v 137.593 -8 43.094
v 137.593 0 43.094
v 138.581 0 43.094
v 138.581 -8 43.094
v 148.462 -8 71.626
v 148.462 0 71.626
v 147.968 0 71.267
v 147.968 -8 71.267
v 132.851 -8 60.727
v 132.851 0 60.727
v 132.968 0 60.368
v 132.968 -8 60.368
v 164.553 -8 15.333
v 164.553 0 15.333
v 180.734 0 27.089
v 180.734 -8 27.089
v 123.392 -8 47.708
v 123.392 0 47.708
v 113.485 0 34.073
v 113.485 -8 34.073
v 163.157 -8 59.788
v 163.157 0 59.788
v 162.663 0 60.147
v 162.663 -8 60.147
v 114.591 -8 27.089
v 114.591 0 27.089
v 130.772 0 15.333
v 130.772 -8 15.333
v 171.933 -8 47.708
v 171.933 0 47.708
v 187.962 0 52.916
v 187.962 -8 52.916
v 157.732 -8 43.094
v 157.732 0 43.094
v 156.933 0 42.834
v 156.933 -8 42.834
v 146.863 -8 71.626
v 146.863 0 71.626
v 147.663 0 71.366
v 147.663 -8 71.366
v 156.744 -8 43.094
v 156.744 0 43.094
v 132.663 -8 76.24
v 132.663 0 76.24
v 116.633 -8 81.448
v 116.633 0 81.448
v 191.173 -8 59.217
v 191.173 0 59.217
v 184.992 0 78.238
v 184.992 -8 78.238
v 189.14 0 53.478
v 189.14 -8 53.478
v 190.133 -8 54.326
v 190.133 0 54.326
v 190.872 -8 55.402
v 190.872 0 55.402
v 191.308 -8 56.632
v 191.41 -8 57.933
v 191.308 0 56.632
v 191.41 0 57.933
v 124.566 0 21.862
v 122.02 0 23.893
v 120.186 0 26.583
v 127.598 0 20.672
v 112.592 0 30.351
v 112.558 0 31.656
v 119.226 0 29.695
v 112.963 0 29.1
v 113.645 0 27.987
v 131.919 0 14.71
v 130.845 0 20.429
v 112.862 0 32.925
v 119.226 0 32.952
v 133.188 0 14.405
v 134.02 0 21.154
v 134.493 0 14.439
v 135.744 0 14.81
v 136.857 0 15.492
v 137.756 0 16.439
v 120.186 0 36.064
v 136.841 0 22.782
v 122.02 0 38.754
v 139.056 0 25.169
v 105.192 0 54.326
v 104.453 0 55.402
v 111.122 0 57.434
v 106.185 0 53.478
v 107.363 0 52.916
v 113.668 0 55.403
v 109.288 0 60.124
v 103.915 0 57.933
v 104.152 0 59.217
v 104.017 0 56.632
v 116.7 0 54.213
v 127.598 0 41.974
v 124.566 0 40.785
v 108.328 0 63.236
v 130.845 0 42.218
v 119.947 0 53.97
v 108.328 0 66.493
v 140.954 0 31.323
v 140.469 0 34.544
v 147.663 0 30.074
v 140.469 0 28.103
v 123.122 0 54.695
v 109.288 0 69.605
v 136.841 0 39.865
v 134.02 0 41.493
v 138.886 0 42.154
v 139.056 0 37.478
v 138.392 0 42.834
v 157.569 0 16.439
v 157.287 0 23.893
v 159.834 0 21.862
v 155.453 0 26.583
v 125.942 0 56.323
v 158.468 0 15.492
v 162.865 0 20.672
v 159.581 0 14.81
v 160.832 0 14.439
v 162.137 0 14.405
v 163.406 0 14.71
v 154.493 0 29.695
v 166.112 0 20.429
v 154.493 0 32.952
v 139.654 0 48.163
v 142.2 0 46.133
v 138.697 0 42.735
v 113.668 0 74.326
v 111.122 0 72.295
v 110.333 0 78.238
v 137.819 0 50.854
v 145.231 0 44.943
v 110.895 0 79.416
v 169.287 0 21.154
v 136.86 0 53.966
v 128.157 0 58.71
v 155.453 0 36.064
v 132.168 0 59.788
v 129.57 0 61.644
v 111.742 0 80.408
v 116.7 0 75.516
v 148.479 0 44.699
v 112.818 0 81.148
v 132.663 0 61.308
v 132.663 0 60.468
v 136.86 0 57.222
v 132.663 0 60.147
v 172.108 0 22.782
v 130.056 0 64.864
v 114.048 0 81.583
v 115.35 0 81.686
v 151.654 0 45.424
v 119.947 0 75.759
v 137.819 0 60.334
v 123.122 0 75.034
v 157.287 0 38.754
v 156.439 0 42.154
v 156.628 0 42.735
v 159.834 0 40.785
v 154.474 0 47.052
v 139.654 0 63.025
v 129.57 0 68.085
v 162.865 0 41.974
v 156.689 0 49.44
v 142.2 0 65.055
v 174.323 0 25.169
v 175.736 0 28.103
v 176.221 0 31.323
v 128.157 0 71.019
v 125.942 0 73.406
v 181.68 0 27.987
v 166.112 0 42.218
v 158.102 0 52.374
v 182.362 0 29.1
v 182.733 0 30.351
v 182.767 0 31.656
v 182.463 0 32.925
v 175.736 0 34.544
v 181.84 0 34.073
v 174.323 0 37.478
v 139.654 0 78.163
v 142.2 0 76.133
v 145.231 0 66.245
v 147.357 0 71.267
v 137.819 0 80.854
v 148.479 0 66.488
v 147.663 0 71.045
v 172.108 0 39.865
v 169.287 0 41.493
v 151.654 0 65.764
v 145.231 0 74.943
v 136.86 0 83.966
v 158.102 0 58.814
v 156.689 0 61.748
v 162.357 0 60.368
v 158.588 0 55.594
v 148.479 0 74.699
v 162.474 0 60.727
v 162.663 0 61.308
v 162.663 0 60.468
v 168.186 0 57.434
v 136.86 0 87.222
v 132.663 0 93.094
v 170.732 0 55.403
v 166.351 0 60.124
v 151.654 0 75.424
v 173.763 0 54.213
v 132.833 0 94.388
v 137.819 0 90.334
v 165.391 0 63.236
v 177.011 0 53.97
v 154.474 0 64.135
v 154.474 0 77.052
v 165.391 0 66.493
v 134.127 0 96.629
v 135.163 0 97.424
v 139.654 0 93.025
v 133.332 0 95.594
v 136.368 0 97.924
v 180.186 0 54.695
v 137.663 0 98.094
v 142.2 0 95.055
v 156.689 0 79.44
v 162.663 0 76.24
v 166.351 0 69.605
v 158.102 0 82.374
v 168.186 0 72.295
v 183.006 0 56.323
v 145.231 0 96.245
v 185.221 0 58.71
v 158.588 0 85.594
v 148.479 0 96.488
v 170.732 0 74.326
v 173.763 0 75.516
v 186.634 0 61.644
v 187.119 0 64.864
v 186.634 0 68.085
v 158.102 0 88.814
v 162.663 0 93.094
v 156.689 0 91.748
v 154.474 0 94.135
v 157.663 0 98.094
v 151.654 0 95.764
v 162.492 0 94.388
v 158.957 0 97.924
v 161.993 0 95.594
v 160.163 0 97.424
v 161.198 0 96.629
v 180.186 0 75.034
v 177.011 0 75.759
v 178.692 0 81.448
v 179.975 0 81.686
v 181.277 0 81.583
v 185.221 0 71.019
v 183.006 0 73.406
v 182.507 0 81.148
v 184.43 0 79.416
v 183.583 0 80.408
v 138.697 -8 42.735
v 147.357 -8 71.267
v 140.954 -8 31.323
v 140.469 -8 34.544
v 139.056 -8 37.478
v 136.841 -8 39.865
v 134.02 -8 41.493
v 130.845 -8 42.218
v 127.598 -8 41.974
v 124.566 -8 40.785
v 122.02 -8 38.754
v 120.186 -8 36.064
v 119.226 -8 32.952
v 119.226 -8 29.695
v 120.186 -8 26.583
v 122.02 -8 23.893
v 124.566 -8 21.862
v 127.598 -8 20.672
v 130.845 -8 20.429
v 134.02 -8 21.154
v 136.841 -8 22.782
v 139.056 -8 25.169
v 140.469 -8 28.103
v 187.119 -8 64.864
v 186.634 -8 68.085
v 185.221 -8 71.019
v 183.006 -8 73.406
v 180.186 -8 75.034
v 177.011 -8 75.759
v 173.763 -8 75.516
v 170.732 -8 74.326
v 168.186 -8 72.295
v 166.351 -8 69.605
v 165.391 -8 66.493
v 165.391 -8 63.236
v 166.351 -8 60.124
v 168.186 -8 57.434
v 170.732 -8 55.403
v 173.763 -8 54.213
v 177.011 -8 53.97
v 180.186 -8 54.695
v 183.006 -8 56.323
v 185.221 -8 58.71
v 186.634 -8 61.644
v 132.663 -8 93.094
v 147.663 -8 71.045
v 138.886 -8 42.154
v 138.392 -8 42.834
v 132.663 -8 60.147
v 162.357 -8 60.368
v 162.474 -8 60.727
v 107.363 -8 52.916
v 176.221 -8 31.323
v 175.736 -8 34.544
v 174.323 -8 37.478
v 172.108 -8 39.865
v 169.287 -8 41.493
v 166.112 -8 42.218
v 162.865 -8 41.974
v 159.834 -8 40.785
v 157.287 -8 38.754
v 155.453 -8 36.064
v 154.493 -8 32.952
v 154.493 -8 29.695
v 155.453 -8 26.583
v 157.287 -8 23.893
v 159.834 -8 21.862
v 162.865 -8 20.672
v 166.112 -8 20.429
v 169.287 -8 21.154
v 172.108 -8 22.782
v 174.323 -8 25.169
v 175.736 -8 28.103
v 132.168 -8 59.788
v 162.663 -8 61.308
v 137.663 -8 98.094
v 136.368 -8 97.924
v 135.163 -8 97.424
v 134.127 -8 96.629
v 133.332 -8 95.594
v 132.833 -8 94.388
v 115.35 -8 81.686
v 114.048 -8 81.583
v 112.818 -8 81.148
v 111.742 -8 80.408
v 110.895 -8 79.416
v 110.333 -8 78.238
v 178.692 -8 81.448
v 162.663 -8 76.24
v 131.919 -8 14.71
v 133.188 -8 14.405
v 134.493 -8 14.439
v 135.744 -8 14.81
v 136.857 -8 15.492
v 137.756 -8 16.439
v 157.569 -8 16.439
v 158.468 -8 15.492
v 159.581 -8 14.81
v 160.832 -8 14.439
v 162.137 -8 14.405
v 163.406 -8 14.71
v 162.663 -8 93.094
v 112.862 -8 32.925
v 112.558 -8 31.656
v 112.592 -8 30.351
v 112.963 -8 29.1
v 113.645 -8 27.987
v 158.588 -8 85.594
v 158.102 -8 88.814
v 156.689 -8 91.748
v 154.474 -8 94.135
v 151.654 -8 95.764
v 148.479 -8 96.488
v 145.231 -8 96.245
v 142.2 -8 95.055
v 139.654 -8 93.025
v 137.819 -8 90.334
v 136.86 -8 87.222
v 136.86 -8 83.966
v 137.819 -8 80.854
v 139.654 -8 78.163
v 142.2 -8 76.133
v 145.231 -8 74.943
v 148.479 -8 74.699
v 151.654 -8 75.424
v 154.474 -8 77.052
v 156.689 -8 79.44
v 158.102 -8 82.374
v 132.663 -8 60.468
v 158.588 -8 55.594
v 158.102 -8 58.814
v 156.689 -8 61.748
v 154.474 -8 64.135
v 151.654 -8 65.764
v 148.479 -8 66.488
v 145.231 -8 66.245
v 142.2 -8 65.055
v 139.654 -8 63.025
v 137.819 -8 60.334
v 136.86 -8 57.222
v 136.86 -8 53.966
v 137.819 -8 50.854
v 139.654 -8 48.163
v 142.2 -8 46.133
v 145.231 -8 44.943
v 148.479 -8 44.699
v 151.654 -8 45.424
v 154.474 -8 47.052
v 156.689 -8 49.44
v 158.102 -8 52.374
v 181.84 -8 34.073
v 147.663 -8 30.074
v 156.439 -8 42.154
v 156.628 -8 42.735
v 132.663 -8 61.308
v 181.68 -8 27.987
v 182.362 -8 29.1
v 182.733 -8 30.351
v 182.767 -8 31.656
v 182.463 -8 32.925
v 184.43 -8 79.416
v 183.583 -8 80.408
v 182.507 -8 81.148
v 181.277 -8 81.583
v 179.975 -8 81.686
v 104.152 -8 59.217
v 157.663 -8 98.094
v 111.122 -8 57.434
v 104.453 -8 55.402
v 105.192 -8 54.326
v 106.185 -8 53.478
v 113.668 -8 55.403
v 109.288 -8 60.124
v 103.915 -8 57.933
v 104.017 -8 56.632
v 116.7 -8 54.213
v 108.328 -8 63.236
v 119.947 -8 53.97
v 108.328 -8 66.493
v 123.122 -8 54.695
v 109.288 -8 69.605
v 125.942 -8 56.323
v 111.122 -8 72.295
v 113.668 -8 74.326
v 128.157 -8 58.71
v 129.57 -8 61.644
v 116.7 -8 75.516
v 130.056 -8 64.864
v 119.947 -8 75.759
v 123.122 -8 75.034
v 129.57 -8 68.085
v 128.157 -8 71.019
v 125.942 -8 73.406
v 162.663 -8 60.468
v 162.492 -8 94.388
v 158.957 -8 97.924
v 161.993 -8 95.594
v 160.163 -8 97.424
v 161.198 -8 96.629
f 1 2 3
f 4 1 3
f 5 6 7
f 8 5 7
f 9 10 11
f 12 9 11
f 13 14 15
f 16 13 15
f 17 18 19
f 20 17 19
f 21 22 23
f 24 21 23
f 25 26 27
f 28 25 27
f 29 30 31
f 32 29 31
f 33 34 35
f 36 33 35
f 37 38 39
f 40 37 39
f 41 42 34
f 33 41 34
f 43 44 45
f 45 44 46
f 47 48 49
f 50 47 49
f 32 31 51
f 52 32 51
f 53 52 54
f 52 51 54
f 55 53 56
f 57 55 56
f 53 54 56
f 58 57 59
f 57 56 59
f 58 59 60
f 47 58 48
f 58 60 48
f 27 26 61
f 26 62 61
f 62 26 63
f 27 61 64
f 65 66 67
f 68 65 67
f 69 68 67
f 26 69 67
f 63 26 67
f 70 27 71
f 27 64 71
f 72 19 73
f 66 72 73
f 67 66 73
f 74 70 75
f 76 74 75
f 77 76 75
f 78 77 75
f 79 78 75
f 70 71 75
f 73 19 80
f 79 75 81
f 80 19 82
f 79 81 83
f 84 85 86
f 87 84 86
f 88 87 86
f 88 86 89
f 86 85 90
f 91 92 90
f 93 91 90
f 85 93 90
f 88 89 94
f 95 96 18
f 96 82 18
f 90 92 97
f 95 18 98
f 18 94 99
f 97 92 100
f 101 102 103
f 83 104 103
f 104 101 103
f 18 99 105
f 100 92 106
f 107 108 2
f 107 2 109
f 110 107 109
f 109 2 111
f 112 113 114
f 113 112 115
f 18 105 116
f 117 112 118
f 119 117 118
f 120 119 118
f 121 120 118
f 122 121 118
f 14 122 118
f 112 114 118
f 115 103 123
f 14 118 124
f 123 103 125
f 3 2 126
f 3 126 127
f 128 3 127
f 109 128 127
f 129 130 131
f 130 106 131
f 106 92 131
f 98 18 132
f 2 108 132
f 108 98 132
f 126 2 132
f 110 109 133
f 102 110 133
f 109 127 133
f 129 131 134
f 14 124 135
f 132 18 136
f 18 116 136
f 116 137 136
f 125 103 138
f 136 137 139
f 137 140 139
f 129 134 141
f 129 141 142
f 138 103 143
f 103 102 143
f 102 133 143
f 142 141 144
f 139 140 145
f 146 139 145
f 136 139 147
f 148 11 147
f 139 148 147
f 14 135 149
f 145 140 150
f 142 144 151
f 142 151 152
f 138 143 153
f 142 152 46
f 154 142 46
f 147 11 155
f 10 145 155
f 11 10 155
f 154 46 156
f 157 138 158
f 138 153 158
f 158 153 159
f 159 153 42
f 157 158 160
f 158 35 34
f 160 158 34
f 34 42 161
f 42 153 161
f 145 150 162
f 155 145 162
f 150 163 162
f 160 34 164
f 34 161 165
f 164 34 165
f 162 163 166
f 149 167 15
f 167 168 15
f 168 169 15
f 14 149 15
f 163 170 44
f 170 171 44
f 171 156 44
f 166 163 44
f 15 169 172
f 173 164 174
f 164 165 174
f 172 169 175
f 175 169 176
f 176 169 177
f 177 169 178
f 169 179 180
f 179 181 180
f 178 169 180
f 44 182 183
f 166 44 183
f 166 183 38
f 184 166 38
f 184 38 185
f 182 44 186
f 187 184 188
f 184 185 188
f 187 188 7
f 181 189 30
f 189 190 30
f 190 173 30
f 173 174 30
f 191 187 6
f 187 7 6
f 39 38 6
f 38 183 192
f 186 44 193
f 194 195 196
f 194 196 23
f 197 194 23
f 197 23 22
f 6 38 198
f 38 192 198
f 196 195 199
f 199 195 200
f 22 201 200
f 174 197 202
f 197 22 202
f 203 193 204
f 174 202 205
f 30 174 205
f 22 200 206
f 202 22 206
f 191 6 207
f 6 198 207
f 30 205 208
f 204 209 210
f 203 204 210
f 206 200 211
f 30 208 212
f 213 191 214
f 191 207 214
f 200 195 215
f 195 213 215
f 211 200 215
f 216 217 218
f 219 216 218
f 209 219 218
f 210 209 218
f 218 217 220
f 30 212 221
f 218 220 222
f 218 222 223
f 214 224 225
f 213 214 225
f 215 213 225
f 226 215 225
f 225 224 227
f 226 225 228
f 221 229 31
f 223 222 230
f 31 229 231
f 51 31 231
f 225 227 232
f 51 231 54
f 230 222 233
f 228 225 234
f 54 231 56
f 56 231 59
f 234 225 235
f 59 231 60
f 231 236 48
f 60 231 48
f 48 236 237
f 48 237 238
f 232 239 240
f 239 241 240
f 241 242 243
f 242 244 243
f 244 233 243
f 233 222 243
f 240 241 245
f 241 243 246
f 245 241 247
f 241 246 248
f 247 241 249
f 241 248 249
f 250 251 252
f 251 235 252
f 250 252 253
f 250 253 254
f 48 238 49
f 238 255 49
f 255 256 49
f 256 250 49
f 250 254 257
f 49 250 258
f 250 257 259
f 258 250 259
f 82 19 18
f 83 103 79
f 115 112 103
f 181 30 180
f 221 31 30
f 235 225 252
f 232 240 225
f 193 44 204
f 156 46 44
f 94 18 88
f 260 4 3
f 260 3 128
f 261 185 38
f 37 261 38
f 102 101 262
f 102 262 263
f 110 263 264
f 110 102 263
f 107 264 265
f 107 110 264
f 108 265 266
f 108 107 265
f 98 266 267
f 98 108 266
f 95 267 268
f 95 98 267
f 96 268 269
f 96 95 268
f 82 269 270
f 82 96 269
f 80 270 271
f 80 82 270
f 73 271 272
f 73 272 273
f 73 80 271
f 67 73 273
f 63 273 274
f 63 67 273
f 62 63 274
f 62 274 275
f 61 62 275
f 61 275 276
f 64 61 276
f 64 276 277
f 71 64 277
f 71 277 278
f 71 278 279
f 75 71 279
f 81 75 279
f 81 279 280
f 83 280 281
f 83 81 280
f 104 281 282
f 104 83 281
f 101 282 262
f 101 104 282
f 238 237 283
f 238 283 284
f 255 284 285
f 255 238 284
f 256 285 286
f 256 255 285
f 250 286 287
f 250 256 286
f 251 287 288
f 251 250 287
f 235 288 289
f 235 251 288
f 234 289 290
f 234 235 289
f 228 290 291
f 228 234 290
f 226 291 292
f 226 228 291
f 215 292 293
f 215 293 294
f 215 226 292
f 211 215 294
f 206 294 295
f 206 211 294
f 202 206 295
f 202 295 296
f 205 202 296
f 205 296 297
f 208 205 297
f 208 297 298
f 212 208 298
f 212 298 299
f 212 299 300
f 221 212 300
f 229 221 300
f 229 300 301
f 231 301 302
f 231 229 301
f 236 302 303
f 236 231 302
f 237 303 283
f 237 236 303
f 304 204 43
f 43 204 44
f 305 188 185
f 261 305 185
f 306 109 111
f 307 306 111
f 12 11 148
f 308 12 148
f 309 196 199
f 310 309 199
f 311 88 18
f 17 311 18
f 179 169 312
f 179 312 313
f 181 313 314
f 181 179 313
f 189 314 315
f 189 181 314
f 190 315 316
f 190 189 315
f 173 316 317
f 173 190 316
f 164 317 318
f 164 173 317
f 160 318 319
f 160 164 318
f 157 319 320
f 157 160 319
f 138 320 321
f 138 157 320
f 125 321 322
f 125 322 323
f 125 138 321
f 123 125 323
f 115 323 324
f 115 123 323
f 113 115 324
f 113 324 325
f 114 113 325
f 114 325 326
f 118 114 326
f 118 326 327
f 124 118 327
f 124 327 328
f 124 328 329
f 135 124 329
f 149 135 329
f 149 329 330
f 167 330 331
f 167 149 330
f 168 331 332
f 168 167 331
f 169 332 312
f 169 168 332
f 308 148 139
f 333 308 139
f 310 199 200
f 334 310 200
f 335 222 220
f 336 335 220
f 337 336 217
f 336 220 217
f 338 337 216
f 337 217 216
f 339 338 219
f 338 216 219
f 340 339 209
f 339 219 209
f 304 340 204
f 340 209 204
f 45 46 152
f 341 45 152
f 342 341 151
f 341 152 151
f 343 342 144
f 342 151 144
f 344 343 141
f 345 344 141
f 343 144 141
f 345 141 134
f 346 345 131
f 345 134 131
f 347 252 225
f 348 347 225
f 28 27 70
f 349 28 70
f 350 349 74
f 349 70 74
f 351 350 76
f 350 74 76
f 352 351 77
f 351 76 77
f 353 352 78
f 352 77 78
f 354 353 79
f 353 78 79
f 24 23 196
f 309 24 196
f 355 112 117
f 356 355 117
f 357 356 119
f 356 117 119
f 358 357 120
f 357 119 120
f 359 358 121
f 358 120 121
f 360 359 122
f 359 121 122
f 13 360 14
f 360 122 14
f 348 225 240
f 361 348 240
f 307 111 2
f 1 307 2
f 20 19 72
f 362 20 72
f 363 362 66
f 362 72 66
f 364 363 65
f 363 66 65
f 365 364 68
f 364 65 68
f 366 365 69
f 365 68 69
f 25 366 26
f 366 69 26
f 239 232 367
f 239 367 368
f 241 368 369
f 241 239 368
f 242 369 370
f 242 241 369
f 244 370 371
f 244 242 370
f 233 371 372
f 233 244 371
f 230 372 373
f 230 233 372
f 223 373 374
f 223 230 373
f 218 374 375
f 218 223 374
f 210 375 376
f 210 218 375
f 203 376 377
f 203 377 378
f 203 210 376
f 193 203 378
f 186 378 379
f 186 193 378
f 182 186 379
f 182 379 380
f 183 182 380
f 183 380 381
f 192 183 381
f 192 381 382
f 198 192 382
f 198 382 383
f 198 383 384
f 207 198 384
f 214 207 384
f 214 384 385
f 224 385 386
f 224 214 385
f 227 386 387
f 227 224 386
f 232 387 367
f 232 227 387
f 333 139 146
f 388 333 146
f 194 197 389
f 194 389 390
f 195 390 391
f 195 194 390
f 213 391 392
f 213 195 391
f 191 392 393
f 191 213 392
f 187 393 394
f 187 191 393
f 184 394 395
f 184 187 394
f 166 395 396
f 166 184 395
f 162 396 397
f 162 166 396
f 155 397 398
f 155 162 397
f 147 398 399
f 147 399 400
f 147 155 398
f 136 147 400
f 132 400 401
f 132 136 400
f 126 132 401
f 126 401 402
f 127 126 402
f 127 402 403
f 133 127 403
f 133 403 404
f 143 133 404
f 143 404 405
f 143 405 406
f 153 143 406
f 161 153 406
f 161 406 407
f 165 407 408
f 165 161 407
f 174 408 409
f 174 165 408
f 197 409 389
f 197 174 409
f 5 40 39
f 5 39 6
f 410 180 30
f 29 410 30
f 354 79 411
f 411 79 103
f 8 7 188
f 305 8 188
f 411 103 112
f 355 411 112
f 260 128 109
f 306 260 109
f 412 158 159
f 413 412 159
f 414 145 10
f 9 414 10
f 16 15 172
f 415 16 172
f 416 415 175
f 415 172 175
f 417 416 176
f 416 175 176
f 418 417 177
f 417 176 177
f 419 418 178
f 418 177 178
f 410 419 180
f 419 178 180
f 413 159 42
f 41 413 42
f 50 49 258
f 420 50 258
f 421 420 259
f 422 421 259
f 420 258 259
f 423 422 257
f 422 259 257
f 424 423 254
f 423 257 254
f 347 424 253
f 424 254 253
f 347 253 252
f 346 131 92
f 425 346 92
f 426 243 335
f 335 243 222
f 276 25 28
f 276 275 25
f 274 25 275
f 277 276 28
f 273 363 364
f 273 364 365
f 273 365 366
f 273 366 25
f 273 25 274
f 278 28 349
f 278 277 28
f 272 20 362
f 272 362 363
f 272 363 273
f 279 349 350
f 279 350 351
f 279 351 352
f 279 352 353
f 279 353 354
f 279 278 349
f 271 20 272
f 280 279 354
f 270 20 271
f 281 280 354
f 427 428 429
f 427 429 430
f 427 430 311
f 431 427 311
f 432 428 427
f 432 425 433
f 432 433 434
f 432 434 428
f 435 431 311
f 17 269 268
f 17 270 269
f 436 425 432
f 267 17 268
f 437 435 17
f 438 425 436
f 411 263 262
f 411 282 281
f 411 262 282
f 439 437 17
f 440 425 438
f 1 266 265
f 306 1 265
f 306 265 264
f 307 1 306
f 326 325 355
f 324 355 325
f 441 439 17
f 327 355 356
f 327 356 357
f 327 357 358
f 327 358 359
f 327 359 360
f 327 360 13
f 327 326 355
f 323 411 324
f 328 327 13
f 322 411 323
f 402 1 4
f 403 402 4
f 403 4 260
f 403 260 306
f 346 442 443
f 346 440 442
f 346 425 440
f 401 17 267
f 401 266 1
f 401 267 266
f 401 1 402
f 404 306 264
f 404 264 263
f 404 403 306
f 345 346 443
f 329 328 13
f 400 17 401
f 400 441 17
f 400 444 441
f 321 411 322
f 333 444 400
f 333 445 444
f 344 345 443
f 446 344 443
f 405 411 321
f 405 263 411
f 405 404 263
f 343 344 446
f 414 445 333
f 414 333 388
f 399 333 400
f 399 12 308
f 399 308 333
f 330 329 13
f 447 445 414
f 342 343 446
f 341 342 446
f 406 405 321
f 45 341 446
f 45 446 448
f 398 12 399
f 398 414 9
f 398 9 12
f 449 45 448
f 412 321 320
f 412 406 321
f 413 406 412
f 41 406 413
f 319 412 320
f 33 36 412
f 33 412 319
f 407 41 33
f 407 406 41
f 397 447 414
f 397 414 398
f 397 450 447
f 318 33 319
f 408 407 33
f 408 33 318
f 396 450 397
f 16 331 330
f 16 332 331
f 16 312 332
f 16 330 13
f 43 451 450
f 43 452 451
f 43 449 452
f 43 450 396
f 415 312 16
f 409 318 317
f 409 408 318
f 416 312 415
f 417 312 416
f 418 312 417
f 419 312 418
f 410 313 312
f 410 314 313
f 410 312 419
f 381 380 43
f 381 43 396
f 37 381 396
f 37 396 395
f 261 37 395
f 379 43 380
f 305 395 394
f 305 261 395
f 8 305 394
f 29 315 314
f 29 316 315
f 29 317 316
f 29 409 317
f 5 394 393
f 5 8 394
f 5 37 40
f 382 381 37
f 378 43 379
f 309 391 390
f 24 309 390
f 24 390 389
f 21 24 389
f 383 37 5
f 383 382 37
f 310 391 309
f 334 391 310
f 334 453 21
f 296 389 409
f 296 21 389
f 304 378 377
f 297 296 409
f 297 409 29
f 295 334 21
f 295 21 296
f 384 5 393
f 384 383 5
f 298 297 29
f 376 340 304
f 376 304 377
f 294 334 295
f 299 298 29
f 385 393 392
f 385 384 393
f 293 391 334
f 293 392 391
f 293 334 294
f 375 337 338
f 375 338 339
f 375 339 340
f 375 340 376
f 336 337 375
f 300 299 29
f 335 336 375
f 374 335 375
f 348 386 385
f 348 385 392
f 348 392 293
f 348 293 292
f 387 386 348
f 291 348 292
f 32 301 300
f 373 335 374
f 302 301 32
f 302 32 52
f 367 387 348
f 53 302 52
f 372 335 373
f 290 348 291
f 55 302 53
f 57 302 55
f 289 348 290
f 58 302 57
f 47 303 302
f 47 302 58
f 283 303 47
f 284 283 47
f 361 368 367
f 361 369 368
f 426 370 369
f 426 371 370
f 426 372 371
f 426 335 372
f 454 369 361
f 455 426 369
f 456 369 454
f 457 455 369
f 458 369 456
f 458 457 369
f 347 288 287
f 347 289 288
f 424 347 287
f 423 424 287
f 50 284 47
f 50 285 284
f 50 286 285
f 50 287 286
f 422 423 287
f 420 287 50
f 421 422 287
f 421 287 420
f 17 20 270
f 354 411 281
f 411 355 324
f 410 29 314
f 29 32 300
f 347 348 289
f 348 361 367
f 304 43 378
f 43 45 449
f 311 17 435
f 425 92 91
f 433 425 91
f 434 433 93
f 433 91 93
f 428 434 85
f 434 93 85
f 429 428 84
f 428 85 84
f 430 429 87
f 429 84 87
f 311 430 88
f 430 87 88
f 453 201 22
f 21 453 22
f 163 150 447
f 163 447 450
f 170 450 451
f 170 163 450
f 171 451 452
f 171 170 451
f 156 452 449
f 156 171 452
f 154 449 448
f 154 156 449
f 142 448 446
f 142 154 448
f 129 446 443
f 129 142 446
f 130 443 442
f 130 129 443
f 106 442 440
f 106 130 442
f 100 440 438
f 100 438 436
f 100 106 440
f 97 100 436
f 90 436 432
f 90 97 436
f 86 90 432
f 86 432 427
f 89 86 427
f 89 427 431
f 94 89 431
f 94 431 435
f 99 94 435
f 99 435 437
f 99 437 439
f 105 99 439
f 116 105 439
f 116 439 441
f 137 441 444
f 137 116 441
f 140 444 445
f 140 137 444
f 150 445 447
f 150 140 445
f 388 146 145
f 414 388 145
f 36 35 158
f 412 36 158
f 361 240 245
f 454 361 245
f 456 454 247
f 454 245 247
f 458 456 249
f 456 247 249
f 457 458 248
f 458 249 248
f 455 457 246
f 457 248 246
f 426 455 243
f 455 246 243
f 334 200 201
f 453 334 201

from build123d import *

# Parameters (mm, degrees)
F0_R     = 10.925
F1_DEPTH = 8


with BuildPart() as f1:
    # F0 (on Front) → F1 (new body)
    with BuildSketch(Plane.XZ):
        Polygon((137.5925300597, 43.0939033628), (138.203267445, 43.0939033628), (132.6625055075, 50.7201079193), (132.6625055075, 44.6957654427), align=None)
        Polygon((132.6625055075, 66.4920412828), (138.3919956762, 68.353665488), (141.9330153387, 73.2274609315), (132.6625055075, 76.2396321698), align=None)
        with BuildLine():
            Line((152.4504447694, 74.5233945768), (153.3919956762, 73.2274609315))
            Line((153.3919956762, 73.2274609315), (162.6625055075, 76.2396321698))
            Line((162.6625055075, 76.2396321698), (162.6625055075, 93.0939033628))
            ThreePointArc((162.6625055075, 93.0939033628), (161.1980394134, 96.6294372687), (157.6625055075, 98.0939033628))
            Line((157.6625055075, 98.0939033628), (137.6625055075, 98.0939033628))
            ThreePointArc((137.6625055075, 98.0939033628), (134.1269716015, 96.6294372687), (132.6625055075, 93.0939033628))
            Line((132.6625055075, 93.0939033628), (132.6625055075, 76.2396321698))
            Line((132.6625055075, 76.2396321698), (141.9330153387, 73.2274609315))
            Line((141.9330153387, 73.2274609315), (142.8745662455, 74.5233945768))
            Line((142.8745662455, 74.5233945768), (146.8630398909, 71.6255988516))
            Line((146.8630398909, 71.6255988516), (147.6625055075, 71.3658367263))
            Line((147.6625055075, 71.3658367263), (148.461971124, 71.6255988516))
            Line((148.461971124, 71.6255988516), (152.4504447694, 74.5233945768))
        make_face()
        with Locations((147.6625055075, 85.5939033628)):
            Circle(F0_R, mode=Mode.SUBTRACT)
        Polygon((153.3919956762, 73.2274609315), (156.9330153387, 68.353665488), (162.6625055075, 66.4920412828), (162.6625055075, 76.2396321698), align=None)
        Polygon((147.9678742002, 71.2666164235), (156.9330153387, 68.353665488), (153.3919956762, 73.2274609315), (148.461971124, 71.6255988516), align=None)
        Polygon((138.5807239074, 43.0939033628), (156.7442871075, 43.0939033628), (162.3571368148, 60.3684785034), (147.6625055075, 71.0447530815), (132.9678742002, 60.3684785034), align=None)
        with Locations((147.6625055075, 55.5939033628)):
            Circle(F0_R, mode=Mode.SUBTRACT)
        Polygon((147.6625055075, 30.0743791122), (153.3919956762, 37.960345794), (147.6625055075, 39.8219699992), (141.9330153387, 37.960345794), align=None)
        with BuildLine():
            Line((137.7558134621, 16.4389872893), (147.6625055075, 30.0743791122))
            Line((147.6625055075, 30.0743791122), (141.9330153387, 37.960345794))
            Line((141.9330153387, 37.960345794), (140.4095539694, 37.4653431886))
            Line((140.4095539694, 37.4653431886), (138.8860926001, 42.1540751645))
            Line((138.8860926001, 42.1540751645), (138.3919956762, 42.8341412375))
            Line((138.3919956762, 42.8341412375), (137.5925300597, 43.0939033628))
            Line((137.5925300597, 43.0939033628), (132.6625055075, 43.0939033628))
            Line((132.6625055075, 43.0939033628), (132.6625055075, 44.6957654427))
            Line((132.6625055075, 44.6957654427), (123.3919956762, 47.707936681))
            Line((123.3919956762, 47.707936681), (113.4853036309, 34.0725448581))
            ThreePointArc((113.4853036309, 34.0725448581), (112.5919468998, 30.3514462714), (114.5914623413, 27.0885336247))
            Line((114.5914623413, 27.0885336247), (130.7718022288, 15.3328285789))
            ThreePointArc((130.7718022288, 15.3328285789), (134.4929008155, 14.4394718478), (137.7558134621, 16.4389872893))
        make_face()
        with Locations((130.0289479387, 31.3233935315)):
            Circle(F0_R, mode=Mode.SUBTRACT)
        with BuildLine():
            Line((162.6625055075, 44.6957654427), (162.6625055075, 43.0939033628))
            Line((162.6625055075, 43.0939033628), (157.7324809553, 43.0939033628))
            Line((157.7324809553, 43.0939033628), (156.9330153387, 42.8341412375))
            Line((156.9330153387, 42.8341412375), (156.4389184148, 42.1540751645))
            Line((156.4389184148, 42.1540751645), (154.9154570455, 37.4653431886))
            Line((154.9154570455, 37.4653431886), (153.3919956762, 37.960345794))
            Line((153.3919956762, 37.960345794), (147.6625055075, 30.0743791122))
            Line((147.6625055075, 30.0743791122), (157.5691975528, 16.4389872893))
            ThreePointArc((157.5691975528, 16.4389872893), (160.8321101995, 14.4394718478), (164.5532087862, 15.3328285789))
            Line((164.5532087861, 15.3328285789), (180.7335486736, 27.0885336247))
            ThreePointArc((180.7335486736, 27.0885336247), (182.7330641152, 30.3514462714), (181.8397073841, 34.0725448581))
            Line((181.8397073841, 34.0725448581), (171.9330153387, 47.707936681))
            Line((171.9330153387, 47.707936681), (162.6625055075, 44.6957654427))
        make_face()
        with Locations((165.2960630762, 31.3233935315)):
            Circle(F0_R, mode=Mode.SUBTRACT)
        with BuildLine():
            Line((166.20352517, 55.5939033628), (171.9330153387, 47.707936681))
            Line((171.9330153387, 47.707936681), (187.9623797842, 52.9161929074))
            ThreePointArc((187.9623797842, 52.9161929074), (190.8723274332, 55.4015229902), (191.1725773938, 59.2165604607))
            Line((191.1725773938, 59.2165604607), (184.9922375063, 78.2376907866))
            ThreePointArc((184.9922375063, 78.2376907866), (182.5069074235, 81.1476384357), (178.6918699529, 81.4478883962))
            Line((178.6918699529, 81.4478883962), (162.6625055075, 76.2396321698))
            Line((162.6625055075, 76.2396321698), (162.6625055075, 66.4920412828))
            Line((162.6625055075, 66.4920412828), (164.1859668768, 65.9970386775))
            Line((164.1859668768, 65.9970386775), (162.6625055075, 61.3083067016))
            Line((162.6625055075, 61.3083067016), (162.6625055075, 60.4676988062))
            Line((162.6625055075, 60.4676988062), (163.1566024313, 59.7876327333))
            Line((163.1566024313, 59.7876327333), (167.1450760767, 56.8898370081))
            Line((167.1450760767, 56.8898370081), (166.20352517, 55.5939033628))
        make_face()
        with Locations((176.1942009963, 64.864413194)):
            Circle(F0_R, mode=Mode.SUBTRACT)
        Polygon((162.6625055075, 50.7201079193), (162.6625055075, 44.6957654427), (171.9330153387, 47.707936681), (166.20352517, 55.5939033628), align=None)
        Polygon((162.6625055075, 60.1466151614), (162.6625055075, 50.7201079193), (166.20352517, 55.5939033628), (163.1566024313, 59.7876327333), align=None)
        Polygon((163.1566024313, 59.7876327333), (166.20352517, 55.5939033628), (167.1450760767, 56.8898370081), align=None)
        Polygon((156.7442871075, 43.0939033628), (157.1217435699, 43.0939033628), (162.6625055075, 50.7201079193), (162.6625055075, 60.1466151614), (162.3571368148, 60.3684785034), align=None)
        Polygon((157.1217435699, 43.0939033628), (157.7324809553, 43.0939033628), (162.6625055075, 44.6957654427), (162.6625055075, 50.7201079193), align=None)
        Polygon((157.7324809553, 43.0939033628), (162.6625055075, 43.0939033628), (162.6625055075, 44.6957654427), align=None)
        Polygon((154.9154570455, 37.4653431886), (156.4389184148, 42.1540751645), (153.3919956762, 37.960345794), align=None)
        Polygon((153.3919956762, 37.960345794), (156.4389184148, 42.1540751645), (156.627646646, 42.7349209346), (147.6625055075, 39.8219699992), align=None)
        Polygon((156.627646646, 42.7349209346), (156.7442871075, 43.0939033628), (138.5807239074, 43.0939033628), (138.6973643689, 42.7349209346), (147.6625055075, 39.8219699992), align=None)
        Polygon((141.9330153387, 37.960345794), (147.6625055075, 39.8219699992), (138.6973643689, 42.7349209346), (138.8860926001, 42.1540751645), align=None)
        Polygon((140.4095539694, 37.4653431886), (141.9330153387, 37.960345794), (138.8860926001, 42.1540751645), align=None)
        Polygon((138.203267445, 43.0939033628), (138.5807239074, 43.0939033628), (132.9678742002, 60.3684785034), (132.6625055075, 60.1466151614), (132.6625055075, 50.7201079193), align=None)
        Polygon((132.6625055075, 43.0939033628), (137.5925300597, 43.0939033628), (132.6625055075, 44.6957654427), align=None)
        Polygon((132.6625055075, 44.6957654427), (132.6625055075, 50.7201079193), (129.121485845, 55.5939033628), (123.3919956762, 47.707936681), align=None)
        Polygon((129.121485845, 55.5939033628), (132.6625055075, 50.7201079193), (132.6625055075, 60.1466151614), (132.1684085836, 59.7876327333), align=None)
        Polygon((128.1799349382, 56.8898370081), (129.121485845, 55.5939033628), (132.1684085836, 59.7876327333), align=None)
        Polygon((132.6625055075, 61.3083067016), (132.8512337387, 60.7274609315), (138.3919956762, 68.353665488), (132.6625055075, 66.4920412828), align=None)
        Polygon((131.1390441382, 65.9970386775), (132.6625055075, 61.3083067016), (132.6625055075, 66.4920412828), align=None)
        Polygon((132.8512337387, 60.7274609315), (132.9678742002, 60.3684785034), (147.6625055075, 71.0447530815), (147.3571368148, 71.2666164235), (138.3919956762, 68.353665488), align=None)
        Polygon((141.9330153387, 73.2274609315), (146.8630398909, 71.6255988516), (142.8745662455, 74.5233945768), align=None)
        Polygon((138.3919956762, 68.353665488), (147.3571368148, 71.2666164235), (146.8630398909, 71.6255988516), (141.9330153387, 73.2274609315), align=None)
        Polygon((147.6625055075, 71.0447530815), (162.3571368148, 60.3684785034), (162.4737772763, 60.7274609315), (156.9330153387, 68.353665488), (147.9678742002, 71.2666164235), align=None)
        Polygon((156.9330153387, 68.353665488), (162.4737772763, 60.7274609315), (162.6625055075, 61.3083067016), (162.6625055075, 66.4920412828), align=None)
        Polygon((162.6625055075, 66.4920412828), (162.6625055075, 61.3083067016), (164.1859668768, 65.9970386775), align=None)
        Polygon((148.461971124, 71.6255988516), (153.3919956762, 73.2274609315), (152.4504447694, 74.5233945768), align=None)
        with BuildLine():
            Line((123.3919956762, 47.707936681), (129.121485845, 55.5939033628))
            Line((129.121485845, 55.5939033628), (128.1799349382, 56.8898370081))
            Line((128.1799349382, 56.8898370081), (132.1684085836, 59.7876327333))
            Line((132.1684085836, 59.7876327333), (132.6625055075, 60.4676988062))
            Line((132.6625055075, 60.4676988062), (132.6625055075, 61.3083067016))
            Line((132.6625055075, 61.3083067016), (131.1390441382, 65.9970386775))
            Line((131.1390441382, 65.9970386775), (132.6625055075, 66.4920412828))
            Line((132.6625055075, 66.4920412828), (132.6625055075, 76.2396321698))
            Line((132.6625055075, 76.2396321698), (116.633141062, 81.4478883962))
            ThreePointArc((116.633141062, 81.4478883962), (112.8181035915, 81.1476384357), (110.3327735087, 78.2376907866))
            Line((110.3327735087, 78.2376907866), (104.1524336212, 59.2165604607))
            ThreePointArc((104.1524336212, 59.2165604607), (104.4526835817, 55.4015229902), (107.3626312308, 52.9161929074))
            Line((107.3626312308, 52.9161929074), (123.3919956762, 47.707936681))
        make_face()
        with Locations((119.1308100186, 64.864413194)):
            Circle(F0_R, mode=Mode.SUBTRACT)
    extrude(amount=F1_DEPTH)


solid = f1.part
